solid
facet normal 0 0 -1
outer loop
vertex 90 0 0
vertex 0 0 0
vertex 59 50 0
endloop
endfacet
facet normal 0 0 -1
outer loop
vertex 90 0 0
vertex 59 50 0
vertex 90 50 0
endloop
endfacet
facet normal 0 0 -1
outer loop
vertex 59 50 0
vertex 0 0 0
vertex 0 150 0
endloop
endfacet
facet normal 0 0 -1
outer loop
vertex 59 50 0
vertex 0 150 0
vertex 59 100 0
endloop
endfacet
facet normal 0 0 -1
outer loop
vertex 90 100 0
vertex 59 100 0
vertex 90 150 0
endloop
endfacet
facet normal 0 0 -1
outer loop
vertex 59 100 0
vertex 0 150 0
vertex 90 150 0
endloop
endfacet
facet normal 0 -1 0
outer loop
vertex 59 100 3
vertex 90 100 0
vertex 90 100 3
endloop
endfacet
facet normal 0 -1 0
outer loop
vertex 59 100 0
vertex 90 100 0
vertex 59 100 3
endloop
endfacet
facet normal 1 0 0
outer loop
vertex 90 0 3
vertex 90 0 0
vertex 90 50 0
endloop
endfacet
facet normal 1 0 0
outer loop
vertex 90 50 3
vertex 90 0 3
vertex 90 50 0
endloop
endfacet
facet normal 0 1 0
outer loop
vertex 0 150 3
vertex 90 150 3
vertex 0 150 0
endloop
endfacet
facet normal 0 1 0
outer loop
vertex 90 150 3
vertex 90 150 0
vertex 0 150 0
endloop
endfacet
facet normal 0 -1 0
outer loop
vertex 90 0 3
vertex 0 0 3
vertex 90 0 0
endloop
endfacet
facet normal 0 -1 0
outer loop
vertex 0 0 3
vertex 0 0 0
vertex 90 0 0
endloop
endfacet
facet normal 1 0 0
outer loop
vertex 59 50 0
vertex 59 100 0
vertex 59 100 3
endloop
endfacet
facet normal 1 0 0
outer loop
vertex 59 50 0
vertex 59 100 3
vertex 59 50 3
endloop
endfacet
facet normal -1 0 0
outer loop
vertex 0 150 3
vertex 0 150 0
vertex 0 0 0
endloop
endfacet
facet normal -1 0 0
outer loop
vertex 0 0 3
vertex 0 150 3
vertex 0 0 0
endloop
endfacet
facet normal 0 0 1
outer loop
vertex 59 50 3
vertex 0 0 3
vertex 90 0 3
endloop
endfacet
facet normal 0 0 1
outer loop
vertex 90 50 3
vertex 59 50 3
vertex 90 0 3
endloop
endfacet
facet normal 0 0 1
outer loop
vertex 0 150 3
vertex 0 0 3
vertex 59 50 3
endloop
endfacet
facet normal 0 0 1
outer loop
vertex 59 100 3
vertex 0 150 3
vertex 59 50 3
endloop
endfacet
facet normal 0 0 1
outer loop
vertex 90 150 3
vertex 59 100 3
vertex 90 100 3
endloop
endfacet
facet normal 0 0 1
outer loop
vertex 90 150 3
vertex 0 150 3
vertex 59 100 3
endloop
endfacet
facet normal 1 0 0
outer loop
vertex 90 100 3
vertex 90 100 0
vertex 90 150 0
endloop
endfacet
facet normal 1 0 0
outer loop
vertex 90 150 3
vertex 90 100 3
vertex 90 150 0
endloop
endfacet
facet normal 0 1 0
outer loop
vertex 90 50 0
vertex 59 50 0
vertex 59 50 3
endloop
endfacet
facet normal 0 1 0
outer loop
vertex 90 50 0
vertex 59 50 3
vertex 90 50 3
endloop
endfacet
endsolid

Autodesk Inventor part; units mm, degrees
ref_plane "YZ Plane" through (0, 0, 0) normal (1, 0, 0) x (0, 1, 0)
ref_plane "XZ Plane" through (0, 0, 0) normal (0, 1, 0) x (-1, 0, 0)
ref_plane "XY Plane" through (0, 0, 0) normal (0, 0, 1) x (1, 0, 0)
sketch "Sketch1" plane through (0, 0, 0) normal (0, 0, 1) x (1, 0, 0)
  line L0 (0, 0) -> (90, 0)
  line L1 (90, 0) -> (90, 150)
  line L2 (90, 150) -> (0, 150)
  line L3 (0, 150) -> (0, 0)
  line L4 (90, 100) -> (59, 100)
  line L5 (59, 100) -> (59, 50)
  line L6 (59, 50) -> (90, 50)
  line L7 (90, 50) -> (90, 100)
  point P0 (-56.8499, 87.1082)
  dimension "d0" = 90
  dimension "d1" = 150
  dimension "d2" = 31
sketch "Sketch2" plane through (0, 0, 0) normal (0, 0, 1) x (1, 0, 0)
  point P0 (0, 0)
extrude "Extrusion1" add sketch "Sketch1" along normal blind 3 contours L3 L2 L1 L4 L5 L6 L0
properties part number "bridge plate"
